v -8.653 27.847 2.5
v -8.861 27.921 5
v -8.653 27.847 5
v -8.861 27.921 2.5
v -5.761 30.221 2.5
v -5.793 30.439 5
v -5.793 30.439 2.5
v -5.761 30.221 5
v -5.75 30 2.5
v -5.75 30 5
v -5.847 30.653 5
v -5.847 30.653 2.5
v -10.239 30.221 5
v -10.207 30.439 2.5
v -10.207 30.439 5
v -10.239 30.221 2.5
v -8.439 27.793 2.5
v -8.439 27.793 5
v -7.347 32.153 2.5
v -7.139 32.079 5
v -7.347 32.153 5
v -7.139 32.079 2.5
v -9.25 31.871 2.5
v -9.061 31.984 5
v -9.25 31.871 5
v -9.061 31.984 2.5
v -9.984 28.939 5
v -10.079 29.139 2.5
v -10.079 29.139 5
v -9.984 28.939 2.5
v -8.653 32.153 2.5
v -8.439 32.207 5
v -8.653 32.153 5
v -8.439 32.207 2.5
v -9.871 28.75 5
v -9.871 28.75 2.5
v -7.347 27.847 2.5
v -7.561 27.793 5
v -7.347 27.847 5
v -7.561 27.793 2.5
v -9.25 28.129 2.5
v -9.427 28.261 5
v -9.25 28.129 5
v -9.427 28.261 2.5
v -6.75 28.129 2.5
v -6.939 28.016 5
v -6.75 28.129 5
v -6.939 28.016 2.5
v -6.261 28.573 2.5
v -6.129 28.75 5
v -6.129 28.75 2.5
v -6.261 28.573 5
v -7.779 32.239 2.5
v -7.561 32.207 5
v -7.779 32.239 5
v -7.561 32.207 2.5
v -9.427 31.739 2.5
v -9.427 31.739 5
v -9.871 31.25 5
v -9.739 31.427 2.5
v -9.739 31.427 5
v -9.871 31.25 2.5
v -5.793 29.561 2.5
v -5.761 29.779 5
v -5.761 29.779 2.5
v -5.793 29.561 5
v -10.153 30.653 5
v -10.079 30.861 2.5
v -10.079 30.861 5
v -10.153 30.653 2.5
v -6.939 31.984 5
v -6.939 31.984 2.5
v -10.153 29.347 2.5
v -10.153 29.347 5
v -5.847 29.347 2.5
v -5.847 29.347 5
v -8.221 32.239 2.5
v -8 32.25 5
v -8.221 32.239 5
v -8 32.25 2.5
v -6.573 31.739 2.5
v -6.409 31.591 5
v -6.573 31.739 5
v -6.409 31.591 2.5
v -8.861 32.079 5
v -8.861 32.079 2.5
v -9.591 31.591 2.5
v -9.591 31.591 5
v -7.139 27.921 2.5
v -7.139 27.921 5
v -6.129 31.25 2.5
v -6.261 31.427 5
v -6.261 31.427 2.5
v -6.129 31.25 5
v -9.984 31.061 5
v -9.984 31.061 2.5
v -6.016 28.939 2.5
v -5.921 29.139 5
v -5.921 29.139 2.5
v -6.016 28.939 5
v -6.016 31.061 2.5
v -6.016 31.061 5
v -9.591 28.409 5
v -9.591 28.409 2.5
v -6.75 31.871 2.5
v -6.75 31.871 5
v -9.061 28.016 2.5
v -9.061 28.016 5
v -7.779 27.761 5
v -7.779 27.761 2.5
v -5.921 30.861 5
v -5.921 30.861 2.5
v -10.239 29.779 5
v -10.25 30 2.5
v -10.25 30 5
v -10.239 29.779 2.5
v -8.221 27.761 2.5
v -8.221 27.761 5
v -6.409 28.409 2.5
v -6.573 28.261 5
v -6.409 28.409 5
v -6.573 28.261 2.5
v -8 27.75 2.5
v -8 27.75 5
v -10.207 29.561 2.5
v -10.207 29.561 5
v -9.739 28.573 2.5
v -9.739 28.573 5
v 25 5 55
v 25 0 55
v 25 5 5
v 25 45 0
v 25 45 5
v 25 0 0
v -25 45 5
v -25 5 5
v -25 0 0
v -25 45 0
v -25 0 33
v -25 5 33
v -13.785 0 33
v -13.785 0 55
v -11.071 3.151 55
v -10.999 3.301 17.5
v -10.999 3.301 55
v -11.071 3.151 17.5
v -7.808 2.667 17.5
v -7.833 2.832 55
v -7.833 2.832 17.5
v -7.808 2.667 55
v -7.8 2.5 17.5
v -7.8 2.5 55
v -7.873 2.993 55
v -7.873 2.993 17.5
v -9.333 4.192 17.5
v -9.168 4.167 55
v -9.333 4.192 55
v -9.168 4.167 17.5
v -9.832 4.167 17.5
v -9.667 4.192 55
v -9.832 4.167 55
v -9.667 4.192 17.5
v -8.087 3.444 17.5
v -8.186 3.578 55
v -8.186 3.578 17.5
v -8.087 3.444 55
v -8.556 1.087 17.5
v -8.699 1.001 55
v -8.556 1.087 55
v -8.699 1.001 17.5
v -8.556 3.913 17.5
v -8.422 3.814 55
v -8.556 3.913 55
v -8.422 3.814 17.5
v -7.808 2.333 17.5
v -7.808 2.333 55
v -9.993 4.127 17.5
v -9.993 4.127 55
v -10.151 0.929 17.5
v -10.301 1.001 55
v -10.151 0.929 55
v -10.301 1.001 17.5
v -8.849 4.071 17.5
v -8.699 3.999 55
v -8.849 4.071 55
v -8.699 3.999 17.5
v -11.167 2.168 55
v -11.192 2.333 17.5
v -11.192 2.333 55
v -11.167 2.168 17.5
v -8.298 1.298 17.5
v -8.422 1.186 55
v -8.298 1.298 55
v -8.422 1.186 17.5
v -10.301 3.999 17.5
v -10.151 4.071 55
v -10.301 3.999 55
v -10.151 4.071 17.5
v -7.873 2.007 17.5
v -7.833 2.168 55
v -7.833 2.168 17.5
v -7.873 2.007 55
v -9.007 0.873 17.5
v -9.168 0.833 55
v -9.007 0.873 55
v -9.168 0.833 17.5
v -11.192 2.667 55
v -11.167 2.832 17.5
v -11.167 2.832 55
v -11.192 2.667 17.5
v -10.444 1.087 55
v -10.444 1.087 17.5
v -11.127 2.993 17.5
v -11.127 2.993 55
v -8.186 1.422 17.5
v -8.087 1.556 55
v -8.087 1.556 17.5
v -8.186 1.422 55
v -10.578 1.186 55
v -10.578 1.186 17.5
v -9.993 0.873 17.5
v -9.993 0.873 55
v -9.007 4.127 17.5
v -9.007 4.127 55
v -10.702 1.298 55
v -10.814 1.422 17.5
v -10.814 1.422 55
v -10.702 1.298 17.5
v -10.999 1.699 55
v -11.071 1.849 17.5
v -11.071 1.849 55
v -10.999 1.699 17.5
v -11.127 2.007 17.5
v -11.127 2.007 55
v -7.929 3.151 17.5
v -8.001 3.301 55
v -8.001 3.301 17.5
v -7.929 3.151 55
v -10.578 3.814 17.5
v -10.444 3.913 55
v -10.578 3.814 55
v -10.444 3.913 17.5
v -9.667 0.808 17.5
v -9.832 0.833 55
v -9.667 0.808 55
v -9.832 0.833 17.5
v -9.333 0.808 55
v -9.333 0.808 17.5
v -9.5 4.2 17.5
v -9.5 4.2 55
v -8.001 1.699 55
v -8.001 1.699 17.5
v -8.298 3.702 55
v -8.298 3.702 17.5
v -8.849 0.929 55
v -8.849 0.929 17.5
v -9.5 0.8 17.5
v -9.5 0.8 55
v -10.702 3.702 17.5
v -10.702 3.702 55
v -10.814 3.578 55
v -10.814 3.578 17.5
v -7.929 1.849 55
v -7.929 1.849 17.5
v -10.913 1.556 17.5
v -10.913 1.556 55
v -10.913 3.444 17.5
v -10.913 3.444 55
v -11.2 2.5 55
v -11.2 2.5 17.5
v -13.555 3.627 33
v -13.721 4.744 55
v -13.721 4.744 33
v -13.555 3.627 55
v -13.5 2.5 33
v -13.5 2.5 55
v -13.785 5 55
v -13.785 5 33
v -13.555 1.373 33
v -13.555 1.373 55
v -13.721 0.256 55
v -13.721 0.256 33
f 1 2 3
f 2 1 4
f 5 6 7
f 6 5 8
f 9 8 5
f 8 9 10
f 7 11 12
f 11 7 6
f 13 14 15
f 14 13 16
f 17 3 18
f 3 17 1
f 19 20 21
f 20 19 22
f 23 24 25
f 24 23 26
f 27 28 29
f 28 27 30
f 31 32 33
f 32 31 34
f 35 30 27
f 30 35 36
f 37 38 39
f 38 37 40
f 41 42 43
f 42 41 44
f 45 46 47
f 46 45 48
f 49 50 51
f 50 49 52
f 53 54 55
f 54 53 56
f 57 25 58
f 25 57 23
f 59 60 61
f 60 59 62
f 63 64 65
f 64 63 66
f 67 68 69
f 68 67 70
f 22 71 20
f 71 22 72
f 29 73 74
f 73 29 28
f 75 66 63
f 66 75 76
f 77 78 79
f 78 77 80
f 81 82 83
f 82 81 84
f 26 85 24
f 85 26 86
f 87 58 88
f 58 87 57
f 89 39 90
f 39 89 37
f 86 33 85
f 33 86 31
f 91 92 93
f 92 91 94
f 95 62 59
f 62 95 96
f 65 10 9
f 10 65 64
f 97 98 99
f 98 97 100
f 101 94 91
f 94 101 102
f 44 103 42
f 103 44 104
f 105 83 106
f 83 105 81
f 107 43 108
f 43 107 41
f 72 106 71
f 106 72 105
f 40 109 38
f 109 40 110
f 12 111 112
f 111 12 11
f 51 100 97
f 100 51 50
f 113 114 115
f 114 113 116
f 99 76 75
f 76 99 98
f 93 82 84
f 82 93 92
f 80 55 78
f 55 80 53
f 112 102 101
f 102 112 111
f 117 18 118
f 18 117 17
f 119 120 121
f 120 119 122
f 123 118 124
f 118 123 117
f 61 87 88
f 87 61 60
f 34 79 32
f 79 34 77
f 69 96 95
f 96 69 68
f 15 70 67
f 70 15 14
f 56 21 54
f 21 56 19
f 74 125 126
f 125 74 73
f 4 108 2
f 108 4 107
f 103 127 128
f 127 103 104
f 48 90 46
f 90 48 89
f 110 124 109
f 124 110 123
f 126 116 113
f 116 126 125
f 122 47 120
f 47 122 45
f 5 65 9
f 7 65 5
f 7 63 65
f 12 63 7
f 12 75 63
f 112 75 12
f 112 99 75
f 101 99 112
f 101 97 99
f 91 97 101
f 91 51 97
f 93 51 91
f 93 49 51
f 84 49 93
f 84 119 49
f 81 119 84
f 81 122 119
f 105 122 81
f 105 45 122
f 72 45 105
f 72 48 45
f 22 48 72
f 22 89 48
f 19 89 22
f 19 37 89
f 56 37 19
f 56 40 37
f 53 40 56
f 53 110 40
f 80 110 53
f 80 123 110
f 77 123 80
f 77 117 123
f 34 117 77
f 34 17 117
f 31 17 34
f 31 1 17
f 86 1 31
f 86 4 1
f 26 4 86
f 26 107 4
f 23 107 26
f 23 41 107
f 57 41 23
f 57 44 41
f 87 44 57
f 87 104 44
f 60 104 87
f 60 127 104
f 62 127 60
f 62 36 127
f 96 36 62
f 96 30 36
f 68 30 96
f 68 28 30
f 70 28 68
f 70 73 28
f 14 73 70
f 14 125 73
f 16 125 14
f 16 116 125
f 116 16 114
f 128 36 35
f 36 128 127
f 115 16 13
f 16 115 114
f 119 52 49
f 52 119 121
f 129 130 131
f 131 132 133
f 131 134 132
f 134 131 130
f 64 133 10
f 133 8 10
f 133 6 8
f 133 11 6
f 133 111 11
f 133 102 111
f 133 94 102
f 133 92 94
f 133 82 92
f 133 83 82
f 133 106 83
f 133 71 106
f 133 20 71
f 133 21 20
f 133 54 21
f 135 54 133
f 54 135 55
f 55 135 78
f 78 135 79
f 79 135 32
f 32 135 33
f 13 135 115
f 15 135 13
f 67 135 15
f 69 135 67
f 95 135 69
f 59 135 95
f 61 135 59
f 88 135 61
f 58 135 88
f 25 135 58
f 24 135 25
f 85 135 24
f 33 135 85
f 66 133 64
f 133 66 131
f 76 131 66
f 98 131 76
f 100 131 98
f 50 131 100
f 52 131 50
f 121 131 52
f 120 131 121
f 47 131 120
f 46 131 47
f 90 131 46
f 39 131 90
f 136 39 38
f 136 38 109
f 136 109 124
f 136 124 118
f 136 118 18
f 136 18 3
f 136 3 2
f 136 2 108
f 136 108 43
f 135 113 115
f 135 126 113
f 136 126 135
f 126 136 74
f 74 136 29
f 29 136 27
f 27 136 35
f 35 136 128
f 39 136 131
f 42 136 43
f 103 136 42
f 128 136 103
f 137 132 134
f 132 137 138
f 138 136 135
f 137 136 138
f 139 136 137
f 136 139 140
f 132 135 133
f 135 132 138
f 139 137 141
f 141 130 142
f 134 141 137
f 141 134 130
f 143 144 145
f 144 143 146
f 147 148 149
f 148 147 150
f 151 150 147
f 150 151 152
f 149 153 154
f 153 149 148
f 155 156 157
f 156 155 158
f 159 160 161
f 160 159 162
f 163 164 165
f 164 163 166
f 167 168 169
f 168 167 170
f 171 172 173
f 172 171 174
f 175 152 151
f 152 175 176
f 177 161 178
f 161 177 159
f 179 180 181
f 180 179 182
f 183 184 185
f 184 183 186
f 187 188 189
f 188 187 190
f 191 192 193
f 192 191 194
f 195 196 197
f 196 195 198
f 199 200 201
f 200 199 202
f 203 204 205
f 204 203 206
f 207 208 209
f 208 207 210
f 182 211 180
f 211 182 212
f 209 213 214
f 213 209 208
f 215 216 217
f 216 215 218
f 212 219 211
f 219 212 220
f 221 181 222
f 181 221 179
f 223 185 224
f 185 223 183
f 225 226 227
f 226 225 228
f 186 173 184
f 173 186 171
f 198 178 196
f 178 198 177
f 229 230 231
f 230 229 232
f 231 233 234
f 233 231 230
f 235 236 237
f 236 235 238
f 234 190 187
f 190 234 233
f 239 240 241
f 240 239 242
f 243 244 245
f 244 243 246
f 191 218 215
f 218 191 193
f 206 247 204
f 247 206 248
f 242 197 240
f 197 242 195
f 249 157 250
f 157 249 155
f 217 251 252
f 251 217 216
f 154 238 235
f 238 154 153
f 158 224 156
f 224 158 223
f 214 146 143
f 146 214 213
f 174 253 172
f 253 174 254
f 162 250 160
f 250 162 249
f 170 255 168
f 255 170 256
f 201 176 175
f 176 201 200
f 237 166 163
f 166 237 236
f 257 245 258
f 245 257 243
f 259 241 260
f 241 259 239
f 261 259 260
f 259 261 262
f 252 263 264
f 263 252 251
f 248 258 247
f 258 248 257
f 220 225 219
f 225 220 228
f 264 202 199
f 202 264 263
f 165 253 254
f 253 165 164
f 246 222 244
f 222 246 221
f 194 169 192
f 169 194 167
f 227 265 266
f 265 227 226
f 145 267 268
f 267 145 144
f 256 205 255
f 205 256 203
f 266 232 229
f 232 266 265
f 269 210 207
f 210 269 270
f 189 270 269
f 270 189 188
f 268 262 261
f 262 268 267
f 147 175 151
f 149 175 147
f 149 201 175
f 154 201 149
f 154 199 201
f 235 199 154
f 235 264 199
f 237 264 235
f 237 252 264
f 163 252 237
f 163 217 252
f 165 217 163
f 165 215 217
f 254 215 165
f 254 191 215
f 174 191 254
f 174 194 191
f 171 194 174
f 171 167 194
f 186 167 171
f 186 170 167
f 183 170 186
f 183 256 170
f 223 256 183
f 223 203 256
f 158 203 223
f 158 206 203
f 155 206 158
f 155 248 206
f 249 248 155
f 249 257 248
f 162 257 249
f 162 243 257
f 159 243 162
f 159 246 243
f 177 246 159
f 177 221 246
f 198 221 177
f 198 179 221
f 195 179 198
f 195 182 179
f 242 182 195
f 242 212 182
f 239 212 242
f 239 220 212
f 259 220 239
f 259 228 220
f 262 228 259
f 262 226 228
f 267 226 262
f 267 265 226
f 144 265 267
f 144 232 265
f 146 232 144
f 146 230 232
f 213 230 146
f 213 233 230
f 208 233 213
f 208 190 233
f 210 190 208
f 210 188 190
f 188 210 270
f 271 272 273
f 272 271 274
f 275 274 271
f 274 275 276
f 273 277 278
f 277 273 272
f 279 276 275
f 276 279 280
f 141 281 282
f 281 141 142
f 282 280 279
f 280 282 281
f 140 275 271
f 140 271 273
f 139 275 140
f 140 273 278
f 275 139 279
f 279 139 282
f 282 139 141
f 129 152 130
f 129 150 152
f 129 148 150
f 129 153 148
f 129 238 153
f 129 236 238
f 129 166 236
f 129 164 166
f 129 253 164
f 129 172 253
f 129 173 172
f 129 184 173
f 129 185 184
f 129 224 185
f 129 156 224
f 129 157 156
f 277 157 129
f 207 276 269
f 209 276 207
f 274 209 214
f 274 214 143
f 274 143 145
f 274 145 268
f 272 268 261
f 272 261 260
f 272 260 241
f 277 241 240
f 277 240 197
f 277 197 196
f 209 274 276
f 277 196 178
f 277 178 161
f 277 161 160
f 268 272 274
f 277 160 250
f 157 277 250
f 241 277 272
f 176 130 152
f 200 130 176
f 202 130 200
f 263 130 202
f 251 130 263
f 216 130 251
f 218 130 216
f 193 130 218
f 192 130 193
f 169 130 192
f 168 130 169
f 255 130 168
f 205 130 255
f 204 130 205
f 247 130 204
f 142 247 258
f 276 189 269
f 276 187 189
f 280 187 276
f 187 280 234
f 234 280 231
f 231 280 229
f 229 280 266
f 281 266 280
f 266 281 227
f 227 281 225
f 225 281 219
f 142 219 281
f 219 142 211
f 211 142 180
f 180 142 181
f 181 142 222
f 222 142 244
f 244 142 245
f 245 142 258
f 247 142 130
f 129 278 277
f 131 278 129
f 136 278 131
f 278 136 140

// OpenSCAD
$fn = 64; // smooth curves

// ---------------------
// Base plate dimensions
// ---------------------
bp_width     = 50;   // X
bp_length    = 45;   // Y
bp_thickness = 5;   // Z
bp_hole_d    = 4.5; // M4 diameter
bp_hole_r    = bp_hole_d/2;
bp_hole_z    = bp_thickness/2;
bp_hole_y    = 30;
bp_hole_x1   = -17;
bp_hole_x2   = 17;

// ---------------------
// Motor plate dimensions
// ---------------------
mp_width     = 50;   // X
mp_length    = 5;    // Y
mp_thickness = 50;   // Z
mp_hole_d    = 3.4; // M3 diameter
mp_hole_r    = mp_hole_d/2;
mp_hole_y    = mp_length/2;   // 2.5
mp_hole_z    = mp_thickness/2; // 25
mp_boss_d    = 23;   // boss diameter
mp_boss_r    = mp_boss_d/2;
mp_boss_y    = mp_length/2;   // 2.5
mp_boss_z    = 28;   // relative to motor plate origin
mp_screw_pattern = 31; // side length of square pattern
mp_screw_offset  = mp_screw_pattern/2; // 15.5
mp_screw_y      = mp_length/2;   // 2.5
mp_screw_z_base = 28;           // base z of pattern

// ---------------------
// Gusset dimensions
// ---------------------
gusset_thickness = 5;   // extrusion along X
gusset_leg       = 20;  // legs along +Y and +Z
gusset_corner_y = 5;   // right‑angle corner y
gusset_corner_z = 5;   // right‑angle corner z

// ---------------------
// Base plate module
// ---------------------
module base_plate() {
    cube([bp_width, bp_length, bp_thickness], center=false);
}

// ---------------------
// Base plate holes
// ---------------------
module base_holes() {
    // first hole
    translate([bp_hole_x1, bp_hole_y, bp_hole_z])
        cylinder(r=bp_hole_r, h=bp_thickness+0.02, center=false);
    // second hole
    translate([bp_hole_x2, bp_hole_y, bp_hole_z])
        cylinder(r=bp_hole_r, h=bp_thickness+0.02, center=false);
}

// ---------------------
// Motor plate module
// ---------------------
module motor_plate() {
    cube([mp_width, mp_length, mp_thickness], center=false);
}

// ---------------------
// Motor plate holes
// ---------------------
module motor_holes() {
    // boss hole
    translate([0, mp_boss_y, mp_boss_z])
        cylinder(r=mp_boss_r, h=mp_thickness+0.02, center=false);
    // screw holes
    for (i = [-1, 1]) {
        for (j = [-1, 1]) {
            translate([i*mp_screw_offset, mp_screw_y, mp_screw_z_base + j*mp_screw_offset])
                cylinder(r=mp_hole_r, h=mp_thickness+0.02, center=false);
        }
    }
}

// ---------------------
// Gusset module
// ---------------------
module gusset(offsetX) {
    // triangle in YZ plane
    polygon(points=[
        [gusset_corner_y, gusset_corner_z],
        [gusset_corner_y+gusset_leg, gusset_corner_z],
        [gusset_corner_y, gusset_corner_z+gusset_leg]
    ]);
    // rotate to XY plane and extrude along Z
    rotate([0, 90, 0]) linear_extrude(height=gusset_thickness);
    // rotate back to X axis
    rotate([0, -90, 0]);
    // translate to the desired X position
    translate([offsetX, 0, 0]);
}

// ---------------------
// Assembly
// ---------------------
union() {
    // Base plate with holes
    difference() {
        translate([-bp_width/2, 0, 0]) base_plate();
        translate([-bp_width/2, 0, 0]) base_holes();
    }

    // Motor plate with holes
    difference() {
        translate([-mp_width/2, 0, 5]) motor_plate();
        translate([-mp_width/2, 0, 5]) motor_holes();
    }

    // Gussets
    gusset(-mp_width/2); // left gusset (x = -25 to -20)
    gusset(mp_width/2);  // right gusset (x = 20 to 25)
}
